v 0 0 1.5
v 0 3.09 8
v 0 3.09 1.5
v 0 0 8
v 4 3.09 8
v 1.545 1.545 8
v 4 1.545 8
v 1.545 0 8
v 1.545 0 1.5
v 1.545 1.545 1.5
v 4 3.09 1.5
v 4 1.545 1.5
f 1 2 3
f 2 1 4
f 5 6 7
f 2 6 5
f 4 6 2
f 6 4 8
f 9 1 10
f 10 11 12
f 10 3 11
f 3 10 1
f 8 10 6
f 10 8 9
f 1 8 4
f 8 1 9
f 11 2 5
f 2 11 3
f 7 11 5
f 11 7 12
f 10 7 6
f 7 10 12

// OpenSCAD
// Generated by SolidPython 1.0.4 on 2021-07-12 16:55:53


union() {
	translate(v = [0, 0, 1.5000000000]) {
		translate(v = [4, 3.0900000000, 0]) {
			rotate(a = -180) {
				union() {
					translate(v = [2.4550000000, 0, 0]) {
						cube(size = [1.5450000000, 3.0900000000, 6.5000000000]);
					}
					cube(size = [4, 1.5450000000, 6.5000000000]);
				}
			}
		}
	}
	translate(v = [0.2000000000, 0.2000000000, 0]) {
		translate(v = [0, 0, 1.5000000000]) {
			translate(v = [3.8000000000, 2.6900000000, 0]) {
				rotate(a = -180) {
					union() {
						translate(v = [2.6550000000, 0, 0]) {
							cube(size = [1.1450000000, 2.6900000000, 6.5000000000]);
						}
						cube(size = [3.8000000000, 1.1450000000, 6.5000000000]);
					}
				}
			}
		}
	}
}
